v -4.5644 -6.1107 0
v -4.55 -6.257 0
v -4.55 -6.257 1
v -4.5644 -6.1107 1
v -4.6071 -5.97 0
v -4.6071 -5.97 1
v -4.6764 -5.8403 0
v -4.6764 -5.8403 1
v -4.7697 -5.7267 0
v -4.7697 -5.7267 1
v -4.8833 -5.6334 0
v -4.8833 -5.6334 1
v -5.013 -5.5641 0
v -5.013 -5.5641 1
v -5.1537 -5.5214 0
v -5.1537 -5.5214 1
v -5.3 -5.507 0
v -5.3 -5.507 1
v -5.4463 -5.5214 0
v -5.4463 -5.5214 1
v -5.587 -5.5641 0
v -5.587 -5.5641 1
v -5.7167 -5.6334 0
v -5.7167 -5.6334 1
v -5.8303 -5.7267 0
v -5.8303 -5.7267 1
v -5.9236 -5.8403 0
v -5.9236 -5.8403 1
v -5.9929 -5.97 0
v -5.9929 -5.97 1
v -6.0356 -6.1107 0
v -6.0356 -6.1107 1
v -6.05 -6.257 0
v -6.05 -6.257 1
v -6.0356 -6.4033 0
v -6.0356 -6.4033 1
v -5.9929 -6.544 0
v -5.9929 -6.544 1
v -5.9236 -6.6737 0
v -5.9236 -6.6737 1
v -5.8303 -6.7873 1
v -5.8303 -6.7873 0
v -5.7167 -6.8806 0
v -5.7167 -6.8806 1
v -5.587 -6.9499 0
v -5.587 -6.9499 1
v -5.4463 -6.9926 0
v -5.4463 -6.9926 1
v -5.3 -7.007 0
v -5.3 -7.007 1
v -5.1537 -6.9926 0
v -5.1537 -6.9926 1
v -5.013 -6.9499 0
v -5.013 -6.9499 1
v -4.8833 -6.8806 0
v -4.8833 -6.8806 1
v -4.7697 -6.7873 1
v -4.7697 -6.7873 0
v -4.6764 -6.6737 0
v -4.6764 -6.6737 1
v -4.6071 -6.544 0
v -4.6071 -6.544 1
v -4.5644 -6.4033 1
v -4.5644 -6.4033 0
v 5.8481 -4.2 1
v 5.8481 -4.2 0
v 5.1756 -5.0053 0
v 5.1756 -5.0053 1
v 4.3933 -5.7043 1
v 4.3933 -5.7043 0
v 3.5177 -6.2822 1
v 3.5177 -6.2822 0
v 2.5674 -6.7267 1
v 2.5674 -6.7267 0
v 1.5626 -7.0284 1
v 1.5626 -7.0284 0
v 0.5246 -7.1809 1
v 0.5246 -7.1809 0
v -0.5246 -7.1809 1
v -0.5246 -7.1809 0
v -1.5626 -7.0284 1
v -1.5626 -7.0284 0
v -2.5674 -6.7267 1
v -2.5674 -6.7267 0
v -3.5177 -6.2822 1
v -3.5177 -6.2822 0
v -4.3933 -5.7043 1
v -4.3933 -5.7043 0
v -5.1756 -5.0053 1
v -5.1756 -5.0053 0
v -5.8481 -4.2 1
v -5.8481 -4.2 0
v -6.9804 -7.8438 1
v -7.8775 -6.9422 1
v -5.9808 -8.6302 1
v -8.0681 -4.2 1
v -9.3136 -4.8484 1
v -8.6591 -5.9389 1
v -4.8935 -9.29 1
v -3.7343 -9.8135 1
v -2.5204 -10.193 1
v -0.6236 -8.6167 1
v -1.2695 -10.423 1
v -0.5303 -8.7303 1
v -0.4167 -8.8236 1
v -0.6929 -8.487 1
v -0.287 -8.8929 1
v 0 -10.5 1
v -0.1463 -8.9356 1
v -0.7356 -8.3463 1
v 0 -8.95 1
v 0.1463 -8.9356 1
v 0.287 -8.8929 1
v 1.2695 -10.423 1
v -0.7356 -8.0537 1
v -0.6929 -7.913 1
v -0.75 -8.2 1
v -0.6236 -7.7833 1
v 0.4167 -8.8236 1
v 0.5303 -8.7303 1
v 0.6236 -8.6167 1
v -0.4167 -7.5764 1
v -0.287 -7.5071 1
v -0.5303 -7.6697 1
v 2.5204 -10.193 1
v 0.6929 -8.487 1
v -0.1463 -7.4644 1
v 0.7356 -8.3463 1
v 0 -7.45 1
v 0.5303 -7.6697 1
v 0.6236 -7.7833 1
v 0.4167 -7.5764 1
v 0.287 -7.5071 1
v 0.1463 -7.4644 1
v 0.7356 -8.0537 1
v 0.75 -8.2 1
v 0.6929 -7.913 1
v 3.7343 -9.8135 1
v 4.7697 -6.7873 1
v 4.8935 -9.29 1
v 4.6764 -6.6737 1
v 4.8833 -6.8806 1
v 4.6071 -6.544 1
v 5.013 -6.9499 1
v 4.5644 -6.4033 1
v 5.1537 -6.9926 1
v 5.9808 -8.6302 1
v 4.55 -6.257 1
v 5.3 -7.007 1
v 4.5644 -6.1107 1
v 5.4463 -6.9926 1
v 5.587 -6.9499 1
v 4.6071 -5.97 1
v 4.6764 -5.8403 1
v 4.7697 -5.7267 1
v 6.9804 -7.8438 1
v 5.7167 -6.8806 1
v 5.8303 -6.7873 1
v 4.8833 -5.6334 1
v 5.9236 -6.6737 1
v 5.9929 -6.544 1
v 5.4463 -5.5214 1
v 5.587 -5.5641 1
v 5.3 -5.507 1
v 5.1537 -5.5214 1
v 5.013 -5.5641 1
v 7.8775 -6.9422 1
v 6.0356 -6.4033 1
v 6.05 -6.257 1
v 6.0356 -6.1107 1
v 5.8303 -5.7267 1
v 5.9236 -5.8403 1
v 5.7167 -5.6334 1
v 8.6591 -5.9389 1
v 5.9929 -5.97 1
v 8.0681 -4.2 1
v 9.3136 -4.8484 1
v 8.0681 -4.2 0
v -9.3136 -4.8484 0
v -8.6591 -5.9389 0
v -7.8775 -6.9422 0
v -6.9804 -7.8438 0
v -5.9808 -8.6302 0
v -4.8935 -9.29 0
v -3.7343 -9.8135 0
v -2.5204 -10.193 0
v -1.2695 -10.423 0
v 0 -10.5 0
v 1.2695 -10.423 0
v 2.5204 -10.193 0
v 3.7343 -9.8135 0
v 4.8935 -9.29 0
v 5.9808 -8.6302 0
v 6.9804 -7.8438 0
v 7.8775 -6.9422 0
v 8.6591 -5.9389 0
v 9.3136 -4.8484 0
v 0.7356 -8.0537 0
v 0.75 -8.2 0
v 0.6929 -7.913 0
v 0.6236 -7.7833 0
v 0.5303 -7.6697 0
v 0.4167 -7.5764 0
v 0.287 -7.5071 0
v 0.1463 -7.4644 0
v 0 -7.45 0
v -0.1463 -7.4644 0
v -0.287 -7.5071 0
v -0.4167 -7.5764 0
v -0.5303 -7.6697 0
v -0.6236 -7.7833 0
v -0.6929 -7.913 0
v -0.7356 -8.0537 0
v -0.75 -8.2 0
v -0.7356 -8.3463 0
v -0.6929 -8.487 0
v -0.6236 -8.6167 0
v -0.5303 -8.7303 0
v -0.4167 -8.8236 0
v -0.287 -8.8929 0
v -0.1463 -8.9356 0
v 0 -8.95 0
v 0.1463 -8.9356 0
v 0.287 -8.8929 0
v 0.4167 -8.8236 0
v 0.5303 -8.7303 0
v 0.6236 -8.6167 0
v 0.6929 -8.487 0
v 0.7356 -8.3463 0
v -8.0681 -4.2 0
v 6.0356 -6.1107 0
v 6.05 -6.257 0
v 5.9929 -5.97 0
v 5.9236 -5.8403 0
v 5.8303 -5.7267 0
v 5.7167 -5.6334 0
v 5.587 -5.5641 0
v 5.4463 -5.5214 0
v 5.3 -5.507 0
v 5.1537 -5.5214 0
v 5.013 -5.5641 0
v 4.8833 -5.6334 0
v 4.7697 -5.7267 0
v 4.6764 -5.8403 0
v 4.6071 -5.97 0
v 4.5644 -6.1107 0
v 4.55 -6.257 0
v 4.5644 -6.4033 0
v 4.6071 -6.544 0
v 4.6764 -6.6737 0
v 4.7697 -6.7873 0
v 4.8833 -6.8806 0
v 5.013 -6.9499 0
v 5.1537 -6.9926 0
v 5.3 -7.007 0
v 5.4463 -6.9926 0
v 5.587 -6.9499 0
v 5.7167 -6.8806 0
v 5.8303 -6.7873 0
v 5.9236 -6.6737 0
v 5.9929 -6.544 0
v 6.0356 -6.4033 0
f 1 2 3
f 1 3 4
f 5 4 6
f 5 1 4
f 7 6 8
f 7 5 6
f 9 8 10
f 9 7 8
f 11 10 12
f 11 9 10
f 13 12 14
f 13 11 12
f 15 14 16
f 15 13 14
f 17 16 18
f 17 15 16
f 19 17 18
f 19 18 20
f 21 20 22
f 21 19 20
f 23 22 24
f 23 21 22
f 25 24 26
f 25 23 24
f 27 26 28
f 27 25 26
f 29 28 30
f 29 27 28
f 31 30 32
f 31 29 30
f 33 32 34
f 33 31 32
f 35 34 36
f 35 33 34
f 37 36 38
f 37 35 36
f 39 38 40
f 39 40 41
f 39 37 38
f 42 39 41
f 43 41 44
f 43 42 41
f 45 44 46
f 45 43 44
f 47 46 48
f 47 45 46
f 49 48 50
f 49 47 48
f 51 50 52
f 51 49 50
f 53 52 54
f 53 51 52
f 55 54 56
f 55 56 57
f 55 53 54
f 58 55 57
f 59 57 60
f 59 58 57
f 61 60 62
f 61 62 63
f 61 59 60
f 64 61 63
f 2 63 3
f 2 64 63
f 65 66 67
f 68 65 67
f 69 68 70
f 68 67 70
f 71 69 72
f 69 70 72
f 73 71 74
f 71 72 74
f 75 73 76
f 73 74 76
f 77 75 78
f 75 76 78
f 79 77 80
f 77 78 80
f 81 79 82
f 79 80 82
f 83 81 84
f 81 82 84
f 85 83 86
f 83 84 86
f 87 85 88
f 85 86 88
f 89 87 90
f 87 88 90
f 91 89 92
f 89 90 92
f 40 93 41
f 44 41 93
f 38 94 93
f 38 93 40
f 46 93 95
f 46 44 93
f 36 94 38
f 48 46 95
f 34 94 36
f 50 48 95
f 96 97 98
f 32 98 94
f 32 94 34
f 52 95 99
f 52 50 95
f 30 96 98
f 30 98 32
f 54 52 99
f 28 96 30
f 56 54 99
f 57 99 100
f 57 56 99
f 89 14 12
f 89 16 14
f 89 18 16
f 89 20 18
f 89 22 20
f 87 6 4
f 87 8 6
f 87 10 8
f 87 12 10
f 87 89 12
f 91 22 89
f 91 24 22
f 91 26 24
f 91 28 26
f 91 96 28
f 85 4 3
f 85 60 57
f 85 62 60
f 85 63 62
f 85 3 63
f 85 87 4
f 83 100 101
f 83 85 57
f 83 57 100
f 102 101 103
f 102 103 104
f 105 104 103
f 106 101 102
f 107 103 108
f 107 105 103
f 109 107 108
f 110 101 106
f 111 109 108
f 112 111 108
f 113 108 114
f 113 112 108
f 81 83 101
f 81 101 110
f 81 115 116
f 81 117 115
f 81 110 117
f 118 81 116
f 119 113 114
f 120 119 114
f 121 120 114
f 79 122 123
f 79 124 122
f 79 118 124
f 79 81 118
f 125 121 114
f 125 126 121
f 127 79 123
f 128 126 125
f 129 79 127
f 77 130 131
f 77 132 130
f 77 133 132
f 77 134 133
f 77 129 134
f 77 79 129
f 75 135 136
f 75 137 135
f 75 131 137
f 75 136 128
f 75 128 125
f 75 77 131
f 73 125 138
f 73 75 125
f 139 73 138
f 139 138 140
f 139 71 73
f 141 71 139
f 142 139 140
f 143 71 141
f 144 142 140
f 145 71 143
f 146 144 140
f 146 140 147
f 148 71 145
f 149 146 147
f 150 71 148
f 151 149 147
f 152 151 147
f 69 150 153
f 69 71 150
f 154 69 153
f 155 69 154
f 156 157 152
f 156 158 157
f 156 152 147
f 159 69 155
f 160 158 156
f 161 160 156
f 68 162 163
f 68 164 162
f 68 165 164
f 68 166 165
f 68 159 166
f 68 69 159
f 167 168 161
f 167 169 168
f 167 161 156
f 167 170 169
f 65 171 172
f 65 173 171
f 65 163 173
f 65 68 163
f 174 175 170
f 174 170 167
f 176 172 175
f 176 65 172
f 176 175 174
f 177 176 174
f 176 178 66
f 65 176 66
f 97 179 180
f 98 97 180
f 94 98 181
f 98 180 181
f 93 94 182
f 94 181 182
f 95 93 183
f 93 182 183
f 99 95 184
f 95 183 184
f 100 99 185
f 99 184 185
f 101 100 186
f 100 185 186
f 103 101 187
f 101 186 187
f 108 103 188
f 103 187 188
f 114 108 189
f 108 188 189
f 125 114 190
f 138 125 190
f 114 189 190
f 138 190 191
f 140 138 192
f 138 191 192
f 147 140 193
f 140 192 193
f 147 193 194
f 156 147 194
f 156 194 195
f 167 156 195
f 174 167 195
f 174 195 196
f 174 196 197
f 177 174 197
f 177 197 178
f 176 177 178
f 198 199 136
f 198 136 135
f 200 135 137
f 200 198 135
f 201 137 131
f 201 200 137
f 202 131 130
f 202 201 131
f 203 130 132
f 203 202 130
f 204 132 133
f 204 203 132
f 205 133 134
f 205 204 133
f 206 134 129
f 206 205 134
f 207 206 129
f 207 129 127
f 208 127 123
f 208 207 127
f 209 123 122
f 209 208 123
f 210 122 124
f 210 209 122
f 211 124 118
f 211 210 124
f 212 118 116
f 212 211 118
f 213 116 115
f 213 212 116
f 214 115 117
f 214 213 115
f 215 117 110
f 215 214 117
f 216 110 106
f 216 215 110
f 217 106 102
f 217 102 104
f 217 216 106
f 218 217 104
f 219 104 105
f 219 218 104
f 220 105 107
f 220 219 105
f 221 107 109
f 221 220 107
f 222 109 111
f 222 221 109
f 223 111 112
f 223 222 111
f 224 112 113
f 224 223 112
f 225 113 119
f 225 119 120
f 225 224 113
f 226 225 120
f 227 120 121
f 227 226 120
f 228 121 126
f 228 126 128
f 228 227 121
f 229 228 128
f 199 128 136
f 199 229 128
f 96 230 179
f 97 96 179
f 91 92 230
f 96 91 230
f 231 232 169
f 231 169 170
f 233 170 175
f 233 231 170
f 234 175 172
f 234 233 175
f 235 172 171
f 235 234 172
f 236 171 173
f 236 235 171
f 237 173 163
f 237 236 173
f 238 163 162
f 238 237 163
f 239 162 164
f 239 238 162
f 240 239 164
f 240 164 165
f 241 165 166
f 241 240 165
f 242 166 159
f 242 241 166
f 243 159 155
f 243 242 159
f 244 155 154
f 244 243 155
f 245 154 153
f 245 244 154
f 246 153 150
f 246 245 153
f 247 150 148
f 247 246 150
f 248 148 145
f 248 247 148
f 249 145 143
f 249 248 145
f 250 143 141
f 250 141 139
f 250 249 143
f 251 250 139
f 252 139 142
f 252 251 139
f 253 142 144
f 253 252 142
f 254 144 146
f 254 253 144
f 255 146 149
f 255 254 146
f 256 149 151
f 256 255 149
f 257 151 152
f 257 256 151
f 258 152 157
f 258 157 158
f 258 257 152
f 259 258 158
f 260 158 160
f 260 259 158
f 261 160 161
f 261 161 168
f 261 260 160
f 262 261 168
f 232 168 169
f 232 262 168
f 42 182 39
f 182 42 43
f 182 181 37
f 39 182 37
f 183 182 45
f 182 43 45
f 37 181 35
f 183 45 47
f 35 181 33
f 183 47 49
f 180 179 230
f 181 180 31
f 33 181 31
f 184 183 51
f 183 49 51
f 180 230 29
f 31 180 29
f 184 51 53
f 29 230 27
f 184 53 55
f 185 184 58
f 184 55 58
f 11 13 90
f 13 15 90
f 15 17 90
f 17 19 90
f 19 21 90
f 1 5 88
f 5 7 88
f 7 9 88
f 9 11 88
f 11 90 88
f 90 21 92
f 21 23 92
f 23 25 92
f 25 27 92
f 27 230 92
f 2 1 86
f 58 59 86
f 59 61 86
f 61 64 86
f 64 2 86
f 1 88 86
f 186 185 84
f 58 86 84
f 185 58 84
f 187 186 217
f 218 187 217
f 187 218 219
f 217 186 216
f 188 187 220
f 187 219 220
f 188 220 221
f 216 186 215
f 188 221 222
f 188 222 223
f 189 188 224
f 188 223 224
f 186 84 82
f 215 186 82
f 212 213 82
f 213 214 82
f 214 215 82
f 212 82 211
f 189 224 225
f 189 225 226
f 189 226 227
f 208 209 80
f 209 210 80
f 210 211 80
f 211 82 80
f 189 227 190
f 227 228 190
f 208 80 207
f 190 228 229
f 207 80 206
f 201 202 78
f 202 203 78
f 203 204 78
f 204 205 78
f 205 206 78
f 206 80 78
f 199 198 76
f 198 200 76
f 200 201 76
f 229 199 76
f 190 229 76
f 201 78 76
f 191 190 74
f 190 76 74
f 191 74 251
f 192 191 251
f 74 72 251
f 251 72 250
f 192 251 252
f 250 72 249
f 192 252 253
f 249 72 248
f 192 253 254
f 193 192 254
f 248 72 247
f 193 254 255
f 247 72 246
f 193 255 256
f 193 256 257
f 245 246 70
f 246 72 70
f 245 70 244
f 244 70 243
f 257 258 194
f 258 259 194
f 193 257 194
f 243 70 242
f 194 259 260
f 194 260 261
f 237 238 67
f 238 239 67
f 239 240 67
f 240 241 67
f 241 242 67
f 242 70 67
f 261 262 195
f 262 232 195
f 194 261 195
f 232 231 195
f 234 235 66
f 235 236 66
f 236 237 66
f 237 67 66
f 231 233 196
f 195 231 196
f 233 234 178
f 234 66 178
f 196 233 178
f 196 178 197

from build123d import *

# Parameters (mm, degrees)
F0_R     = 0.75
F1_DEPTH = 1


with BuildPart() as f1:
    # F0 (on Top) → F1 (new body)
    with BuildSketch(Plane.XY):
        with BuildLine():
            Line((-8.068125, -4.2), (-9.313614, -4.84836))
            ThreePointArc((-9.313614, -4.84836), (0, -10.5), (9.313614, -4.84836))
            Line((9.313614, -4.84836), (8.068125, -4.2))
            Line((8.068125, -4.2), (5.848077, -4.2))
            ThreePointArc((5.848077, -4.2), (0, -7.2), (-5.848077, -4.2))
            Line((-5.848077, -4.2), (-8.068125, -4.2))
        make_face()
        with Locations((0, -8.2)):
            Circle(F0_R, mode=Mode.SUBTRACT)
        with Locations((-5.3, -6.256996)):
            Circle(F0_R, mode=Mode.SUBTRACT)
        with Locations((5.3, -6.256996)):
            Circle(F0_R, mode=Mode.SUBTRACT)
    extrude(amount=F1_DEPTH)


solid = f1.part
